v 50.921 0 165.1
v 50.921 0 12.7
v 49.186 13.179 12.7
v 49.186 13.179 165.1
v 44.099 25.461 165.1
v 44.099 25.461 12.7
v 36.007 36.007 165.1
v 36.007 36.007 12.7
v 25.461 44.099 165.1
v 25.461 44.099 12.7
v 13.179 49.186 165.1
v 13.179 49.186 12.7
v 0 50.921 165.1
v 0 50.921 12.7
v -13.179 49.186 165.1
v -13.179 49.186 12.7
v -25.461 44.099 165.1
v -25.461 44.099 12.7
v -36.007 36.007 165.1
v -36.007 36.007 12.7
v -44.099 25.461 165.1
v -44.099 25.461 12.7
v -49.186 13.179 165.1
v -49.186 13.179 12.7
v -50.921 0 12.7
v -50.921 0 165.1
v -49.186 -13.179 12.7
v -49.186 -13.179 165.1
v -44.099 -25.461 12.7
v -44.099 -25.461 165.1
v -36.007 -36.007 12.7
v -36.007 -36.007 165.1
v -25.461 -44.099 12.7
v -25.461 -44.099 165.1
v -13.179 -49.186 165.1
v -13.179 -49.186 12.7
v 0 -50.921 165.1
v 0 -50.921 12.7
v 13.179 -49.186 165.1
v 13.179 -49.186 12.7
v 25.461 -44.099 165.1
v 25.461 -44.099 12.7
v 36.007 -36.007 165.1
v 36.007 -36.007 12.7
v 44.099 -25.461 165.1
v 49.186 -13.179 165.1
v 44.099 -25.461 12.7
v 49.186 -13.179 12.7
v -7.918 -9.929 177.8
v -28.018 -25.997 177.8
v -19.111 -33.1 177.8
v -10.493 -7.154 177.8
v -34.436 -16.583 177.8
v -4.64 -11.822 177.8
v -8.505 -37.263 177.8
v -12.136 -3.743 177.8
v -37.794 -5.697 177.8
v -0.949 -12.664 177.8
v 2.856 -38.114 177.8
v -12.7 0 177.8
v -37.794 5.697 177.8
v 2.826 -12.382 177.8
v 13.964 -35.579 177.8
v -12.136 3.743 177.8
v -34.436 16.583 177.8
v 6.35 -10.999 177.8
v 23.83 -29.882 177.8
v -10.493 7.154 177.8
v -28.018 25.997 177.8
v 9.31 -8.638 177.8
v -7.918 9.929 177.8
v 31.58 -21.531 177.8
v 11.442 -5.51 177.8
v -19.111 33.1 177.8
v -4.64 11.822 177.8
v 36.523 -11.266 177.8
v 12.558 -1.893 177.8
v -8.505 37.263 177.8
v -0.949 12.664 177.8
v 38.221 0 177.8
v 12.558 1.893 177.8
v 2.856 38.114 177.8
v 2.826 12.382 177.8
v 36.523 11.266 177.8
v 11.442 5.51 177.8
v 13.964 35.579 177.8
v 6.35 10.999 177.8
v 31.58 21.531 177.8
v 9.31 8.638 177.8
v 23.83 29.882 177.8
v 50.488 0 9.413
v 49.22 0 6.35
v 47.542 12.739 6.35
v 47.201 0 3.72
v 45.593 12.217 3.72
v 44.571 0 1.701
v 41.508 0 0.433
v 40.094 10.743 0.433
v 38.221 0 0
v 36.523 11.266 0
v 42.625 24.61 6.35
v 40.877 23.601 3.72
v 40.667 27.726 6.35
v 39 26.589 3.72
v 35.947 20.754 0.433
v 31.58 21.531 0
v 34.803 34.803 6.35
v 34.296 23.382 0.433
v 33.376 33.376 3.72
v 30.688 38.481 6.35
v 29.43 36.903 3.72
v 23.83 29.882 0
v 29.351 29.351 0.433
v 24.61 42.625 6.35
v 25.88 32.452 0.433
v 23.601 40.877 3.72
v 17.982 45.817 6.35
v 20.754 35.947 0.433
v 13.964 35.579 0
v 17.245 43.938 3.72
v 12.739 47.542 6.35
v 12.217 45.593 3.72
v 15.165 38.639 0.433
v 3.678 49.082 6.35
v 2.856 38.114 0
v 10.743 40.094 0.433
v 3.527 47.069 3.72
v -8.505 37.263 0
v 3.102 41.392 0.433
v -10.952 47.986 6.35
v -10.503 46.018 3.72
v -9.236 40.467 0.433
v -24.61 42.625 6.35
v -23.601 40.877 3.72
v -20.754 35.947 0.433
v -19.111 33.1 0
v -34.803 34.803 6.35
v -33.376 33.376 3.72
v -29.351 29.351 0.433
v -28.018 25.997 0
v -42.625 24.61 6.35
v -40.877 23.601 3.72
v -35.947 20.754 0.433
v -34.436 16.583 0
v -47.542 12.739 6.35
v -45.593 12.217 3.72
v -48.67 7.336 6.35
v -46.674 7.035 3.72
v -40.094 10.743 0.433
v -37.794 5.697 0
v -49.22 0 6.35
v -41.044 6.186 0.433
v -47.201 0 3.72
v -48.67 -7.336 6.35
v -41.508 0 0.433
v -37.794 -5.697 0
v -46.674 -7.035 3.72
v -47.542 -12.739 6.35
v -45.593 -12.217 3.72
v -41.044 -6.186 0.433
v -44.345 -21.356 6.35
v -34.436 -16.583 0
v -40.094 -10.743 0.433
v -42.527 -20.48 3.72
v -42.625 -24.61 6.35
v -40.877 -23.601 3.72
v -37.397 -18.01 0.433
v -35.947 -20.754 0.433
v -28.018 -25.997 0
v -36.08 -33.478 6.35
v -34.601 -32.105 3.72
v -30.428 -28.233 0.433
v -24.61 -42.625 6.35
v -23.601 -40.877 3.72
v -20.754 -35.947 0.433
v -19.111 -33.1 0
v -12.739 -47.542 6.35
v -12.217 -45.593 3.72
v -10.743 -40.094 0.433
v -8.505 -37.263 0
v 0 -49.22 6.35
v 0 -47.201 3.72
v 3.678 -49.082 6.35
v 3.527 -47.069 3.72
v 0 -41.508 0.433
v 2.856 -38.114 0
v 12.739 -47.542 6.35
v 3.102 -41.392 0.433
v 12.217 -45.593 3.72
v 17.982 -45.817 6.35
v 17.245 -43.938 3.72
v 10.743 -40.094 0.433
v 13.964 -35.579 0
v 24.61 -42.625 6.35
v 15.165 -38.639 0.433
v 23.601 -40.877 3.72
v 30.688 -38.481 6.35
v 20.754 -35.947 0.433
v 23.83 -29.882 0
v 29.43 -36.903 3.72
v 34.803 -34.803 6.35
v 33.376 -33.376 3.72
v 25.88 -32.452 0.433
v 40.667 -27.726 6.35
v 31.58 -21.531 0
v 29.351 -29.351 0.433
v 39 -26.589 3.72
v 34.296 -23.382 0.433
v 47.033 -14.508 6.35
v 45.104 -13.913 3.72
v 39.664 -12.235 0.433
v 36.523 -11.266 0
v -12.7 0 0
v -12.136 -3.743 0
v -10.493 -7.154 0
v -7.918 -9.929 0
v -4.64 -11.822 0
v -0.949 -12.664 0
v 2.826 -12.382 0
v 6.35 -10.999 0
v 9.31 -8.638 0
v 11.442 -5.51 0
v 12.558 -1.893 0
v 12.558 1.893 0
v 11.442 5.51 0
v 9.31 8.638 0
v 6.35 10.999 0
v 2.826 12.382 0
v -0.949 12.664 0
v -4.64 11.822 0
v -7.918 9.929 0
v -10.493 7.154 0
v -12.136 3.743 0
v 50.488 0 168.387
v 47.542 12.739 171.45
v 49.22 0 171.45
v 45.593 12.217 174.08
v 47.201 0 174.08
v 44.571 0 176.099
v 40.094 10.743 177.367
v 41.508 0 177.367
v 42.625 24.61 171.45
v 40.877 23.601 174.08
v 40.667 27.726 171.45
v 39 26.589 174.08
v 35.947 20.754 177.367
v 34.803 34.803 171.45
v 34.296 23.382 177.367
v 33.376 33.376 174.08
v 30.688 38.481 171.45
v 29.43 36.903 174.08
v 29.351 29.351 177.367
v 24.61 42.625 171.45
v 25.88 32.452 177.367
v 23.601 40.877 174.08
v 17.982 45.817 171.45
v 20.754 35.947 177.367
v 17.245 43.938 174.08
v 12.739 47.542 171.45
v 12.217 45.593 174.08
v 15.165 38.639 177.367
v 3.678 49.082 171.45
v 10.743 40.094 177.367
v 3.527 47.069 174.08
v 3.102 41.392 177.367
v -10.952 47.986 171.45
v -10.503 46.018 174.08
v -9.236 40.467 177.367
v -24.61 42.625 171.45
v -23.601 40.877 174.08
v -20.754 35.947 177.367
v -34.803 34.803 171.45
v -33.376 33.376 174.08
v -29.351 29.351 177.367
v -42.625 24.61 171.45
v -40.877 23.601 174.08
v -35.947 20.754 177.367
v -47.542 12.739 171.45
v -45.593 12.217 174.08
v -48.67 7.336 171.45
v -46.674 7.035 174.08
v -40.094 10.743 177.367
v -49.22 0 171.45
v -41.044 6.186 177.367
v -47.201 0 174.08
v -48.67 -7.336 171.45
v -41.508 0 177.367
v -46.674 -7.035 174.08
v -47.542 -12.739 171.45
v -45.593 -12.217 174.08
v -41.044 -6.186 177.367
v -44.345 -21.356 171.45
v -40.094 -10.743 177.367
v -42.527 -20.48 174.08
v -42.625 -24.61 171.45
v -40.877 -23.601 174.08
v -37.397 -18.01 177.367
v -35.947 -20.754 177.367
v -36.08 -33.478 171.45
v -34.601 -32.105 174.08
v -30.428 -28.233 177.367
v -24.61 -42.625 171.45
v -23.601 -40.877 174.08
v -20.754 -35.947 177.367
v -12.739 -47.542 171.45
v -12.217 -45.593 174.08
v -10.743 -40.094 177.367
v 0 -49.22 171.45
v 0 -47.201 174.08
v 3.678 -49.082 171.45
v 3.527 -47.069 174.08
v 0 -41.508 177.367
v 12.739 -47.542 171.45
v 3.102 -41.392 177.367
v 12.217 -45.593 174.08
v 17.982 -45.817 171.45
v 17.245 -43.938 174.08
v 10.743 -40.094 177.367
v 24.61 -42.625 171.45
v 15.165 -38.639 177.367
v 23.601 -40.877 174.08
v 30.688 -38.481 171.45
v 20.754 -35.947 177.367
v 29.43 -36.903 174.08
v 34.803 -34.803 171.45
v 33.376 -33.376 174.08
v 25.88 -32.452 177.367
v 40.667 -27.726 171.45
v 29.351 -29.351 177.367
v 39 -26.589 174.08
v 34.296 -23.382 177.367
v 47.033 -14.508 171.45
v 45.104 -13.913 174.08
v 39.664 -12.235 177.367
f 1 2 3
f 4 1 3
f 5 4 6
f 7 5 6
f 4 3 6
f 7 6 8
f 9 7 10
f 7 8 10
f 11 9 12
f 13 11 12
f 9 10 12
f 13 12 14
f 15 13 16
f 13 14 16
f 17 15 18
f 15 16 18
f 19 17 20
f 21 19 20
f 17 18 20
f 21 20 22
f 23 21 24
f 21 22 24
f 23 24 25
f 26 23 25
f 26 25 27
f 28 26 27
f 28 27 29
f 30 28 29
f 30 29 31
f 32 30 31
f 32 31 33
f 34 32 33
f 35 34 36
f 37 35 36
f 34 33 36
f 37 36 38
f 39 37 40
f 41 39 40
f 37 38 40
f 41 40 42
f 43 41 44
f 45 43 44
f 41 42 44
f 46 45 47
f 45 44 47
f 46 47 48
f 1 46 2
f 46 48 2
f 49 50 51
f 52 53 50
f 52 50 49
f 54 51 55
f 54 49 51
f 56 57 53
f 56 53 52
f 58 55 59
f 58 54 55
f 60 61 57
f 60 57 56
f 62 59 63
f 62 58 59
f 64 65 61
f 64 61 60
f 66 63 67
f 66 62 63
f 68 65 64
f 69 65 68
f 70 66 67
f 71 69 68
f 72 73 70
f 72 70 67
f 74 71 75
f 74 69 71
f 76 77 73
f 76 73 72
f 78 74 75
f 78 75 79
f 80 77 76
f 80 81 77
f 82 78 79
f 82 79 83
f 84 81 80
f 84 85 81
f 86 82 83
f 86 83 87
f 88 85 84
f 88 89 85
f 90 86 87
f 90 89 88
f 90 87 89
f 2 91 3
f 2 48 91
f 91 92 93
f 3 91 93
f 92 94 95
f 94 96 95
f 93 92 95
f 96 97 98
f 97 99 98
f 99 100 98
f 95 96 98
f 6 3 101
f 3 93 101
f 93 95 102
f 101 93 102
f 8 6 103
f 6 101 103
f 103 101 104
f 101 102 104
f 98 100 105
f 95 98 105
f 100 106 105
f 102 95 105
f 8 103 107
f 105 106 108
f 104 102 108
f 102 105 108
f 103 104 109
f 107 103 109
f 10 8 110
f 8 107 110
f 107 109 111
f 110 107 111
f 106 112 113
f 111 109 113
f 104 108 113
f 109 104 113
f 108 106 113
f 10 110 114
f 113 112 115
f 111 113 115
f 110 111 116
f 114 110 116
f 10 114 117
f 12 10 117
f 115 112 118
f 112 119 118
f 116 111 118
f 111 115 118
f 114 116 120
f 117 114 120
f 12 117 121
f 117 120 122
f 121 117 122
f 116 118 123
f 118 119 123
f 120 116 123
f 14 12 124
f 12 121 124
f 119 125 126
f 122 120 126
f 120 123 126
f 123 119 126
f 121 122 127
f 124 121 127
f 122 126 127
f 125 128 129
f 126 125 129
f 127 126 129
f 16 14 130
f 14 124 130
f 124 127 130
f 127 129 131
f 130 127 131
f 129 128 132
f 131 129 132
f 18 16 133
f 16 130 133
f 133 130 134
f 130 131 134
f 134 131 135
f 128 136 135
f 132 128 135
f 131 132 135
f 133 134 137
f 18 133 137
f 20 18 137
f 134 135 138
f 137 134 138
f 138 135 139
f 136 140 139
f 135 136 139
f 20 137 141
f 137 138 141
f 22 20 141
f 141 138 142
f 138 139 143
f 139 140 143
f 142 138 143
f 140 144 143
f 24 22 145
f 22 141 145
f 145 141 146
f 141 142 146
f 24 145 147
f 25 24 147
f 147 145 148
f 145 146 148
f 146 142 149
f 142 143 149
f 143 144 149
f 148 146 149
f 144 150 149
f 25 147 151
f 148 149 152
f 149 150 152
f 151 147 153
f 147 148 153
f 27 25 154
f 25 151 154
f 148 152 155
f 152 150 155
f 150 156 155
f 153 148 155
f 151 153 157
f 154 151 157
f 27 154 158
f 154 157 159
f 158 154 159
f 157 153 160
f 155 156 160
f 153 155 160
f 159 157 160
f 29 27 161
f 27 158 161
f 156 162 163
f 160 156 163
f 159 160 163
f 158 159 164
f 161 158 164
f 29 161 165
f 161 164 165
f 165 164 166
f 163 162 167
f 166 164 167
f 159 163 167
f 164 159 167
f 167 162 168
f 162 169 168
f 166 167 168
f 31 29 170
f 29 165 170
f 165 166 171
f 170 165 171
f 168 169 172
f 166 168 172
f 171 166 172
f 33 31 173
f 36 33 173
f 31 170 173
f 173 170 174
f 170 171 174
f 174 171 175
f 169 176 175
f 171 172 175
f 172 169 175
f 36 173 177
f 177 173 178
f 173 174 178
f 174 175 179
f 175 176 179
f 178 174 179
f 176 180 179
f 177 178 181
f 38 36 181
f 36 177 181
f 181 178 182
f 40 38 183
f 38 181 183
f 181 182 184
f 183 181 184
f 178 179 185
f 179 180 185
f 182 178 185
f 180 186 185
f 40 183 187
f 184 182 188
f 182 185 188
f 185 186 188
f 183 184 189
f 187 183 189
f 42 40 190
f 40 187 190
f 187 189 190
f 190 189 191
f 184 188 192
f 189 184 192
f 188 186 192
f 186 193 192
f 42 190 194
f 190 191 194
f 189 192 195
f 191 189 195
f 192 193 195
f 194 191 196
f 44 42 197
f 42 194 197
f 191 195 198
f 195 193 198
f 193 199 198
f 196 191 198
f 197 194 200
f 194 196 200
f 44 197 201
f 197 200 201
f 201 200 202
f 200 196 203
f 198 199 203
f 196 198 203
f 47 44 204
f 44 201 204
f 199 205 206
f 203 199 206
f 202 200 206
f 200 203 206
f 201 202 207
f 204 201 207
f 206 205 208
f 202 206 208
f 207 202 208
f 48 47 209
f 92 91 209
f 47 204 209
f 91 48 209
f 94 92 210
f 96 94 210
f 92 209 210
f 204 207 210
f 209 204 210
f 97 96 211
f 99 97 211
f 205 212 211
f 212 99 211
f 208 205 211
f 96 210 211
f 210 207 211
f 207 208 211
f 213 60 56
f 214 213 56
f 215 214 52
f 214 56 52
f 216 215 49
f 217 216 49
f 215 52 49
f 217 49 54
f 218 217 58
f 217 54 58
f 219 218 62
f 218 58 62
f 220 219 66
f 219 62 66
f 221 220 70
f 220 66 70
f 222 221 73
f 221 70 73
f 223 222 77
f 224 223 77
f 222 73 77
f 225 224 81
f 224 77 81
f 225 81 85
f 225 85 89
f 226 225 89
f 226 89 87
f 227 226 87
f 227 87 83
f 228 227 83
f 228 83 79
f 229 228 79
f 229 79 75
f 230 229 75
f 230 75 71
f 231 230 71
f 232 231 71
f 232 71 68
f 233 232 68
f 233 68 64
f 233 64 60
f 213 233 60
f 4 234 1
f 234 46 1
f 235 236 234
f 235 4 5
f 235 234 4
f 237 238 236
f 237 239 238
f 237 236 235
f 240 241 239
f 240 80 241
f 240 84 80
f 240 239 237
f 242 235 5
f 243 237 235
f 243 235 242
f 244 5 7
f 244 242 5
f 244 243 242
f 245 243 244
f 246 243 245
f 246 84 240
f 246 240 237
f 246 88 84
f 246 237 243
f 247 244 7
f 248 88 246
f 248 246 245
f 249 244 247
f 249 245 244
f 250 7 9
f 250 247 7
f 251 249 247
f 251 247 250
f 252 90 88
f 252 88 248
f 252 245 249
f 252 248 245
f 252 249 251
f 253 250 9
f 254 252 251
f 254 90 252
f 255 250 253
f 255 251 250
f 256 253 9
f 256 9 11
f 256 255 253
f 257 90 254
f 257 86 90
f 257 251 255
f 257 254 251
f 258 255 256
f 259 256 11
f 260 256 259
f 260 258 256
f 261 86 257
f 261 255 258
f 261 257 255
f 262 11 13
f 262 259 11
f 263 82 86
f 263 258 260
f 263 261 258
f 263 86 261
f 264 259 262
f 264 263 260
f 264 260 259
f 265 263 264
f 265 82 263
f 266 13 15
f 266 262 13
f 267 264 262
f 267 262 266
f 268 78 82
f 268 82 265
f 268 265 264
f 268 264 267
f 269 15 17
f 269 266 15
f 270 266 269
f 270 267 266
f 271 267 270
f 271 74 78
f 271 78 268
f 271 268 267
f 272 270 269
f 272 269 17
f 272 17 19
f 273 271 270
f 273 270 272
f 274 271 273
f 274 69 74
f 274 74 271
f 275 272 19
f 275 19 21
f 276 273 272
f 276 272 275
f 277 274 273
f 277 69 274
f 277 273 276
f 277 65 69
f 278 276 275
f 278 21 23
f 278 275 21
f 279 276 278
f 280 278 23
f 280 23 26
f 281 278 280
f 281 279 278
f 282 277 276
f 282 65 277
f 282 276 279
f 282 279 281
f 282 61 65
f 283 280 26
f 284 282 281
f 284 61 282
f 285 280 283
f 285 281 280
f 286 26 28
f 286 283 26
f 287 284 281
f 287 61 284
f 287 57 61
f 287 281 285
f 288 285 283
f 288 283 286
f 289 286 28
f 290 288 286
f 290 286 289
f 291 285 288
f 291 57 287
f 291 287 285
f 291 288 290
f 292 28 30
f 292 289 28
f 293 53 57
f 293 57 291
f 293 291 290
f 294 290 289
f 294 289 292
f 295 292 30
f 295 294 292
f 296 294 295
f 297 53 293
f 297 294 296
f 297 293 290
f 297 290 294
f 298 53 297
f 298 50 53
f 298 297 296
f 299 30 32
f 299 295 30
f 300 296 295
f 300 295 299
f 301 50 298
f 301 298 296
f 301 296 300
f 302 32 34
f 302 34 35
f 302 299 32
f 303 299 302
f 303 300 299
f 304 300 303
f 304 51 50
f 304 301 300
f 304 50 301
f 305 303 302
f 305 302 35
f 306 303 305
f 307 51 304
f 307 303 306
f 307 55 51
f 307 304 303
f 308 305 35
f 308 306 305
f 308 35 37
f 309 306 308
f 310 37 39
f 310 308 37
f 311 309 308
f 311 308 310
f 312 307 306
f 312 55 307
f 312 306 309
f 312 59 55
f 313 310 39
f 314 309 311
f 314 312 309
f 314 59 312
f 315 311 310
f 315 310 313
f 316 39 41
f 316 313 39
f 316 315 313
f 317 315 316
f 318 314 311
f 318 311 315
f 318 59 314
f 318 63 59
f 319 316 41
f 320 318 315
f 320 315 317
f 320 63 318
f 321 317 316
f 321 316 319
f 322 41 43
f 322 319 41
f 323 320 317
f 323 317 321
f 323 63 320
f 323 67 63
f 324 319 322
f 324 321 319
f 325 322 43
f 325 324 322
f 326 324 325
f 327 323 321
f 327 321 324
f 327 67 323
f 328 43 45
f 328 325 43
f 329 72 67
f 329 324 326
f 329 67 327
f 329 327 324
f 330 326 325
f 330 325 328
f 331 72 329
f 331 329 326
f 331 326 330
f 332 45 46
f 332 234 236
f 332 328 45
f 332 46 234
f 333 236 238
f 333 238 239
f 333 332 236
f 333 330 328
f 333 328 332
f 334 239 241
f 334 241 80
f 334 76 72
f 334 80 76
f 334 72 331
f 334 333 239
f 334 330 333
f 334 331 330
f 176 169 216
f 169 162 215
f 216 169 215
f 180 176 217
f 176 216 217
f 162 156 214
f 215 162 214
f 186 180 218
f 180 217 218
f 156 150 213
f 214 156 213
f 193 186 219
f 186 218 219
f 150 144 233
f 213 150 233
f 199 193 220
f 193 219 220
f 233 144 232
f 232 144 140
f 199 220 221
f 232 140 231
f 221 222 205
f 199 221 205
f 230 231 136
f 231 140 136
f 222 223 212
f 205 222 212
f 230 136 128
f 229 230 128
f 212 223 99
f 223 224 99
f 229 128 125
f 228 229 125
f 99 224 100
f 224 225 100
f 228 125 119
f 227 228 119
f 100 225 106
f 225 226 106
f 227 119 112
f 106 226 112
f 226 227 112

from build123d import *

# Parameters (mm, degrees)
F0_R     = 50.921014
F1_DEPTH = 177.8
F2_R     = 12.7
F5_D     = 25.4
F5_DEPTH = 177.8


with BuildPart() as f1:
    # F0 (on Top) → F1 (new body)
    with BuildSketch(Plane.XY):
        Circle(F0_R)
    extrude(amount=F1_DEPTH)

    # F2
    f2_edges = [f1.edges().sort_by_distance(p)[0] for p in [
        (-50.921014, 0, 0),
        (-50.921014, 0, 177.8),
    ]]
    fillet(f2_edges, radius=F2_R)

    # F5
    with Locations(Plane(origin=(0, 0, 0), x_dir=(1, 0, 0), z_dir=(0, 0, -1))):
        with Locations((0, 0)):
            Hole(F5_D / 2, depth=F5_DEPTH)


solid = f1.part
